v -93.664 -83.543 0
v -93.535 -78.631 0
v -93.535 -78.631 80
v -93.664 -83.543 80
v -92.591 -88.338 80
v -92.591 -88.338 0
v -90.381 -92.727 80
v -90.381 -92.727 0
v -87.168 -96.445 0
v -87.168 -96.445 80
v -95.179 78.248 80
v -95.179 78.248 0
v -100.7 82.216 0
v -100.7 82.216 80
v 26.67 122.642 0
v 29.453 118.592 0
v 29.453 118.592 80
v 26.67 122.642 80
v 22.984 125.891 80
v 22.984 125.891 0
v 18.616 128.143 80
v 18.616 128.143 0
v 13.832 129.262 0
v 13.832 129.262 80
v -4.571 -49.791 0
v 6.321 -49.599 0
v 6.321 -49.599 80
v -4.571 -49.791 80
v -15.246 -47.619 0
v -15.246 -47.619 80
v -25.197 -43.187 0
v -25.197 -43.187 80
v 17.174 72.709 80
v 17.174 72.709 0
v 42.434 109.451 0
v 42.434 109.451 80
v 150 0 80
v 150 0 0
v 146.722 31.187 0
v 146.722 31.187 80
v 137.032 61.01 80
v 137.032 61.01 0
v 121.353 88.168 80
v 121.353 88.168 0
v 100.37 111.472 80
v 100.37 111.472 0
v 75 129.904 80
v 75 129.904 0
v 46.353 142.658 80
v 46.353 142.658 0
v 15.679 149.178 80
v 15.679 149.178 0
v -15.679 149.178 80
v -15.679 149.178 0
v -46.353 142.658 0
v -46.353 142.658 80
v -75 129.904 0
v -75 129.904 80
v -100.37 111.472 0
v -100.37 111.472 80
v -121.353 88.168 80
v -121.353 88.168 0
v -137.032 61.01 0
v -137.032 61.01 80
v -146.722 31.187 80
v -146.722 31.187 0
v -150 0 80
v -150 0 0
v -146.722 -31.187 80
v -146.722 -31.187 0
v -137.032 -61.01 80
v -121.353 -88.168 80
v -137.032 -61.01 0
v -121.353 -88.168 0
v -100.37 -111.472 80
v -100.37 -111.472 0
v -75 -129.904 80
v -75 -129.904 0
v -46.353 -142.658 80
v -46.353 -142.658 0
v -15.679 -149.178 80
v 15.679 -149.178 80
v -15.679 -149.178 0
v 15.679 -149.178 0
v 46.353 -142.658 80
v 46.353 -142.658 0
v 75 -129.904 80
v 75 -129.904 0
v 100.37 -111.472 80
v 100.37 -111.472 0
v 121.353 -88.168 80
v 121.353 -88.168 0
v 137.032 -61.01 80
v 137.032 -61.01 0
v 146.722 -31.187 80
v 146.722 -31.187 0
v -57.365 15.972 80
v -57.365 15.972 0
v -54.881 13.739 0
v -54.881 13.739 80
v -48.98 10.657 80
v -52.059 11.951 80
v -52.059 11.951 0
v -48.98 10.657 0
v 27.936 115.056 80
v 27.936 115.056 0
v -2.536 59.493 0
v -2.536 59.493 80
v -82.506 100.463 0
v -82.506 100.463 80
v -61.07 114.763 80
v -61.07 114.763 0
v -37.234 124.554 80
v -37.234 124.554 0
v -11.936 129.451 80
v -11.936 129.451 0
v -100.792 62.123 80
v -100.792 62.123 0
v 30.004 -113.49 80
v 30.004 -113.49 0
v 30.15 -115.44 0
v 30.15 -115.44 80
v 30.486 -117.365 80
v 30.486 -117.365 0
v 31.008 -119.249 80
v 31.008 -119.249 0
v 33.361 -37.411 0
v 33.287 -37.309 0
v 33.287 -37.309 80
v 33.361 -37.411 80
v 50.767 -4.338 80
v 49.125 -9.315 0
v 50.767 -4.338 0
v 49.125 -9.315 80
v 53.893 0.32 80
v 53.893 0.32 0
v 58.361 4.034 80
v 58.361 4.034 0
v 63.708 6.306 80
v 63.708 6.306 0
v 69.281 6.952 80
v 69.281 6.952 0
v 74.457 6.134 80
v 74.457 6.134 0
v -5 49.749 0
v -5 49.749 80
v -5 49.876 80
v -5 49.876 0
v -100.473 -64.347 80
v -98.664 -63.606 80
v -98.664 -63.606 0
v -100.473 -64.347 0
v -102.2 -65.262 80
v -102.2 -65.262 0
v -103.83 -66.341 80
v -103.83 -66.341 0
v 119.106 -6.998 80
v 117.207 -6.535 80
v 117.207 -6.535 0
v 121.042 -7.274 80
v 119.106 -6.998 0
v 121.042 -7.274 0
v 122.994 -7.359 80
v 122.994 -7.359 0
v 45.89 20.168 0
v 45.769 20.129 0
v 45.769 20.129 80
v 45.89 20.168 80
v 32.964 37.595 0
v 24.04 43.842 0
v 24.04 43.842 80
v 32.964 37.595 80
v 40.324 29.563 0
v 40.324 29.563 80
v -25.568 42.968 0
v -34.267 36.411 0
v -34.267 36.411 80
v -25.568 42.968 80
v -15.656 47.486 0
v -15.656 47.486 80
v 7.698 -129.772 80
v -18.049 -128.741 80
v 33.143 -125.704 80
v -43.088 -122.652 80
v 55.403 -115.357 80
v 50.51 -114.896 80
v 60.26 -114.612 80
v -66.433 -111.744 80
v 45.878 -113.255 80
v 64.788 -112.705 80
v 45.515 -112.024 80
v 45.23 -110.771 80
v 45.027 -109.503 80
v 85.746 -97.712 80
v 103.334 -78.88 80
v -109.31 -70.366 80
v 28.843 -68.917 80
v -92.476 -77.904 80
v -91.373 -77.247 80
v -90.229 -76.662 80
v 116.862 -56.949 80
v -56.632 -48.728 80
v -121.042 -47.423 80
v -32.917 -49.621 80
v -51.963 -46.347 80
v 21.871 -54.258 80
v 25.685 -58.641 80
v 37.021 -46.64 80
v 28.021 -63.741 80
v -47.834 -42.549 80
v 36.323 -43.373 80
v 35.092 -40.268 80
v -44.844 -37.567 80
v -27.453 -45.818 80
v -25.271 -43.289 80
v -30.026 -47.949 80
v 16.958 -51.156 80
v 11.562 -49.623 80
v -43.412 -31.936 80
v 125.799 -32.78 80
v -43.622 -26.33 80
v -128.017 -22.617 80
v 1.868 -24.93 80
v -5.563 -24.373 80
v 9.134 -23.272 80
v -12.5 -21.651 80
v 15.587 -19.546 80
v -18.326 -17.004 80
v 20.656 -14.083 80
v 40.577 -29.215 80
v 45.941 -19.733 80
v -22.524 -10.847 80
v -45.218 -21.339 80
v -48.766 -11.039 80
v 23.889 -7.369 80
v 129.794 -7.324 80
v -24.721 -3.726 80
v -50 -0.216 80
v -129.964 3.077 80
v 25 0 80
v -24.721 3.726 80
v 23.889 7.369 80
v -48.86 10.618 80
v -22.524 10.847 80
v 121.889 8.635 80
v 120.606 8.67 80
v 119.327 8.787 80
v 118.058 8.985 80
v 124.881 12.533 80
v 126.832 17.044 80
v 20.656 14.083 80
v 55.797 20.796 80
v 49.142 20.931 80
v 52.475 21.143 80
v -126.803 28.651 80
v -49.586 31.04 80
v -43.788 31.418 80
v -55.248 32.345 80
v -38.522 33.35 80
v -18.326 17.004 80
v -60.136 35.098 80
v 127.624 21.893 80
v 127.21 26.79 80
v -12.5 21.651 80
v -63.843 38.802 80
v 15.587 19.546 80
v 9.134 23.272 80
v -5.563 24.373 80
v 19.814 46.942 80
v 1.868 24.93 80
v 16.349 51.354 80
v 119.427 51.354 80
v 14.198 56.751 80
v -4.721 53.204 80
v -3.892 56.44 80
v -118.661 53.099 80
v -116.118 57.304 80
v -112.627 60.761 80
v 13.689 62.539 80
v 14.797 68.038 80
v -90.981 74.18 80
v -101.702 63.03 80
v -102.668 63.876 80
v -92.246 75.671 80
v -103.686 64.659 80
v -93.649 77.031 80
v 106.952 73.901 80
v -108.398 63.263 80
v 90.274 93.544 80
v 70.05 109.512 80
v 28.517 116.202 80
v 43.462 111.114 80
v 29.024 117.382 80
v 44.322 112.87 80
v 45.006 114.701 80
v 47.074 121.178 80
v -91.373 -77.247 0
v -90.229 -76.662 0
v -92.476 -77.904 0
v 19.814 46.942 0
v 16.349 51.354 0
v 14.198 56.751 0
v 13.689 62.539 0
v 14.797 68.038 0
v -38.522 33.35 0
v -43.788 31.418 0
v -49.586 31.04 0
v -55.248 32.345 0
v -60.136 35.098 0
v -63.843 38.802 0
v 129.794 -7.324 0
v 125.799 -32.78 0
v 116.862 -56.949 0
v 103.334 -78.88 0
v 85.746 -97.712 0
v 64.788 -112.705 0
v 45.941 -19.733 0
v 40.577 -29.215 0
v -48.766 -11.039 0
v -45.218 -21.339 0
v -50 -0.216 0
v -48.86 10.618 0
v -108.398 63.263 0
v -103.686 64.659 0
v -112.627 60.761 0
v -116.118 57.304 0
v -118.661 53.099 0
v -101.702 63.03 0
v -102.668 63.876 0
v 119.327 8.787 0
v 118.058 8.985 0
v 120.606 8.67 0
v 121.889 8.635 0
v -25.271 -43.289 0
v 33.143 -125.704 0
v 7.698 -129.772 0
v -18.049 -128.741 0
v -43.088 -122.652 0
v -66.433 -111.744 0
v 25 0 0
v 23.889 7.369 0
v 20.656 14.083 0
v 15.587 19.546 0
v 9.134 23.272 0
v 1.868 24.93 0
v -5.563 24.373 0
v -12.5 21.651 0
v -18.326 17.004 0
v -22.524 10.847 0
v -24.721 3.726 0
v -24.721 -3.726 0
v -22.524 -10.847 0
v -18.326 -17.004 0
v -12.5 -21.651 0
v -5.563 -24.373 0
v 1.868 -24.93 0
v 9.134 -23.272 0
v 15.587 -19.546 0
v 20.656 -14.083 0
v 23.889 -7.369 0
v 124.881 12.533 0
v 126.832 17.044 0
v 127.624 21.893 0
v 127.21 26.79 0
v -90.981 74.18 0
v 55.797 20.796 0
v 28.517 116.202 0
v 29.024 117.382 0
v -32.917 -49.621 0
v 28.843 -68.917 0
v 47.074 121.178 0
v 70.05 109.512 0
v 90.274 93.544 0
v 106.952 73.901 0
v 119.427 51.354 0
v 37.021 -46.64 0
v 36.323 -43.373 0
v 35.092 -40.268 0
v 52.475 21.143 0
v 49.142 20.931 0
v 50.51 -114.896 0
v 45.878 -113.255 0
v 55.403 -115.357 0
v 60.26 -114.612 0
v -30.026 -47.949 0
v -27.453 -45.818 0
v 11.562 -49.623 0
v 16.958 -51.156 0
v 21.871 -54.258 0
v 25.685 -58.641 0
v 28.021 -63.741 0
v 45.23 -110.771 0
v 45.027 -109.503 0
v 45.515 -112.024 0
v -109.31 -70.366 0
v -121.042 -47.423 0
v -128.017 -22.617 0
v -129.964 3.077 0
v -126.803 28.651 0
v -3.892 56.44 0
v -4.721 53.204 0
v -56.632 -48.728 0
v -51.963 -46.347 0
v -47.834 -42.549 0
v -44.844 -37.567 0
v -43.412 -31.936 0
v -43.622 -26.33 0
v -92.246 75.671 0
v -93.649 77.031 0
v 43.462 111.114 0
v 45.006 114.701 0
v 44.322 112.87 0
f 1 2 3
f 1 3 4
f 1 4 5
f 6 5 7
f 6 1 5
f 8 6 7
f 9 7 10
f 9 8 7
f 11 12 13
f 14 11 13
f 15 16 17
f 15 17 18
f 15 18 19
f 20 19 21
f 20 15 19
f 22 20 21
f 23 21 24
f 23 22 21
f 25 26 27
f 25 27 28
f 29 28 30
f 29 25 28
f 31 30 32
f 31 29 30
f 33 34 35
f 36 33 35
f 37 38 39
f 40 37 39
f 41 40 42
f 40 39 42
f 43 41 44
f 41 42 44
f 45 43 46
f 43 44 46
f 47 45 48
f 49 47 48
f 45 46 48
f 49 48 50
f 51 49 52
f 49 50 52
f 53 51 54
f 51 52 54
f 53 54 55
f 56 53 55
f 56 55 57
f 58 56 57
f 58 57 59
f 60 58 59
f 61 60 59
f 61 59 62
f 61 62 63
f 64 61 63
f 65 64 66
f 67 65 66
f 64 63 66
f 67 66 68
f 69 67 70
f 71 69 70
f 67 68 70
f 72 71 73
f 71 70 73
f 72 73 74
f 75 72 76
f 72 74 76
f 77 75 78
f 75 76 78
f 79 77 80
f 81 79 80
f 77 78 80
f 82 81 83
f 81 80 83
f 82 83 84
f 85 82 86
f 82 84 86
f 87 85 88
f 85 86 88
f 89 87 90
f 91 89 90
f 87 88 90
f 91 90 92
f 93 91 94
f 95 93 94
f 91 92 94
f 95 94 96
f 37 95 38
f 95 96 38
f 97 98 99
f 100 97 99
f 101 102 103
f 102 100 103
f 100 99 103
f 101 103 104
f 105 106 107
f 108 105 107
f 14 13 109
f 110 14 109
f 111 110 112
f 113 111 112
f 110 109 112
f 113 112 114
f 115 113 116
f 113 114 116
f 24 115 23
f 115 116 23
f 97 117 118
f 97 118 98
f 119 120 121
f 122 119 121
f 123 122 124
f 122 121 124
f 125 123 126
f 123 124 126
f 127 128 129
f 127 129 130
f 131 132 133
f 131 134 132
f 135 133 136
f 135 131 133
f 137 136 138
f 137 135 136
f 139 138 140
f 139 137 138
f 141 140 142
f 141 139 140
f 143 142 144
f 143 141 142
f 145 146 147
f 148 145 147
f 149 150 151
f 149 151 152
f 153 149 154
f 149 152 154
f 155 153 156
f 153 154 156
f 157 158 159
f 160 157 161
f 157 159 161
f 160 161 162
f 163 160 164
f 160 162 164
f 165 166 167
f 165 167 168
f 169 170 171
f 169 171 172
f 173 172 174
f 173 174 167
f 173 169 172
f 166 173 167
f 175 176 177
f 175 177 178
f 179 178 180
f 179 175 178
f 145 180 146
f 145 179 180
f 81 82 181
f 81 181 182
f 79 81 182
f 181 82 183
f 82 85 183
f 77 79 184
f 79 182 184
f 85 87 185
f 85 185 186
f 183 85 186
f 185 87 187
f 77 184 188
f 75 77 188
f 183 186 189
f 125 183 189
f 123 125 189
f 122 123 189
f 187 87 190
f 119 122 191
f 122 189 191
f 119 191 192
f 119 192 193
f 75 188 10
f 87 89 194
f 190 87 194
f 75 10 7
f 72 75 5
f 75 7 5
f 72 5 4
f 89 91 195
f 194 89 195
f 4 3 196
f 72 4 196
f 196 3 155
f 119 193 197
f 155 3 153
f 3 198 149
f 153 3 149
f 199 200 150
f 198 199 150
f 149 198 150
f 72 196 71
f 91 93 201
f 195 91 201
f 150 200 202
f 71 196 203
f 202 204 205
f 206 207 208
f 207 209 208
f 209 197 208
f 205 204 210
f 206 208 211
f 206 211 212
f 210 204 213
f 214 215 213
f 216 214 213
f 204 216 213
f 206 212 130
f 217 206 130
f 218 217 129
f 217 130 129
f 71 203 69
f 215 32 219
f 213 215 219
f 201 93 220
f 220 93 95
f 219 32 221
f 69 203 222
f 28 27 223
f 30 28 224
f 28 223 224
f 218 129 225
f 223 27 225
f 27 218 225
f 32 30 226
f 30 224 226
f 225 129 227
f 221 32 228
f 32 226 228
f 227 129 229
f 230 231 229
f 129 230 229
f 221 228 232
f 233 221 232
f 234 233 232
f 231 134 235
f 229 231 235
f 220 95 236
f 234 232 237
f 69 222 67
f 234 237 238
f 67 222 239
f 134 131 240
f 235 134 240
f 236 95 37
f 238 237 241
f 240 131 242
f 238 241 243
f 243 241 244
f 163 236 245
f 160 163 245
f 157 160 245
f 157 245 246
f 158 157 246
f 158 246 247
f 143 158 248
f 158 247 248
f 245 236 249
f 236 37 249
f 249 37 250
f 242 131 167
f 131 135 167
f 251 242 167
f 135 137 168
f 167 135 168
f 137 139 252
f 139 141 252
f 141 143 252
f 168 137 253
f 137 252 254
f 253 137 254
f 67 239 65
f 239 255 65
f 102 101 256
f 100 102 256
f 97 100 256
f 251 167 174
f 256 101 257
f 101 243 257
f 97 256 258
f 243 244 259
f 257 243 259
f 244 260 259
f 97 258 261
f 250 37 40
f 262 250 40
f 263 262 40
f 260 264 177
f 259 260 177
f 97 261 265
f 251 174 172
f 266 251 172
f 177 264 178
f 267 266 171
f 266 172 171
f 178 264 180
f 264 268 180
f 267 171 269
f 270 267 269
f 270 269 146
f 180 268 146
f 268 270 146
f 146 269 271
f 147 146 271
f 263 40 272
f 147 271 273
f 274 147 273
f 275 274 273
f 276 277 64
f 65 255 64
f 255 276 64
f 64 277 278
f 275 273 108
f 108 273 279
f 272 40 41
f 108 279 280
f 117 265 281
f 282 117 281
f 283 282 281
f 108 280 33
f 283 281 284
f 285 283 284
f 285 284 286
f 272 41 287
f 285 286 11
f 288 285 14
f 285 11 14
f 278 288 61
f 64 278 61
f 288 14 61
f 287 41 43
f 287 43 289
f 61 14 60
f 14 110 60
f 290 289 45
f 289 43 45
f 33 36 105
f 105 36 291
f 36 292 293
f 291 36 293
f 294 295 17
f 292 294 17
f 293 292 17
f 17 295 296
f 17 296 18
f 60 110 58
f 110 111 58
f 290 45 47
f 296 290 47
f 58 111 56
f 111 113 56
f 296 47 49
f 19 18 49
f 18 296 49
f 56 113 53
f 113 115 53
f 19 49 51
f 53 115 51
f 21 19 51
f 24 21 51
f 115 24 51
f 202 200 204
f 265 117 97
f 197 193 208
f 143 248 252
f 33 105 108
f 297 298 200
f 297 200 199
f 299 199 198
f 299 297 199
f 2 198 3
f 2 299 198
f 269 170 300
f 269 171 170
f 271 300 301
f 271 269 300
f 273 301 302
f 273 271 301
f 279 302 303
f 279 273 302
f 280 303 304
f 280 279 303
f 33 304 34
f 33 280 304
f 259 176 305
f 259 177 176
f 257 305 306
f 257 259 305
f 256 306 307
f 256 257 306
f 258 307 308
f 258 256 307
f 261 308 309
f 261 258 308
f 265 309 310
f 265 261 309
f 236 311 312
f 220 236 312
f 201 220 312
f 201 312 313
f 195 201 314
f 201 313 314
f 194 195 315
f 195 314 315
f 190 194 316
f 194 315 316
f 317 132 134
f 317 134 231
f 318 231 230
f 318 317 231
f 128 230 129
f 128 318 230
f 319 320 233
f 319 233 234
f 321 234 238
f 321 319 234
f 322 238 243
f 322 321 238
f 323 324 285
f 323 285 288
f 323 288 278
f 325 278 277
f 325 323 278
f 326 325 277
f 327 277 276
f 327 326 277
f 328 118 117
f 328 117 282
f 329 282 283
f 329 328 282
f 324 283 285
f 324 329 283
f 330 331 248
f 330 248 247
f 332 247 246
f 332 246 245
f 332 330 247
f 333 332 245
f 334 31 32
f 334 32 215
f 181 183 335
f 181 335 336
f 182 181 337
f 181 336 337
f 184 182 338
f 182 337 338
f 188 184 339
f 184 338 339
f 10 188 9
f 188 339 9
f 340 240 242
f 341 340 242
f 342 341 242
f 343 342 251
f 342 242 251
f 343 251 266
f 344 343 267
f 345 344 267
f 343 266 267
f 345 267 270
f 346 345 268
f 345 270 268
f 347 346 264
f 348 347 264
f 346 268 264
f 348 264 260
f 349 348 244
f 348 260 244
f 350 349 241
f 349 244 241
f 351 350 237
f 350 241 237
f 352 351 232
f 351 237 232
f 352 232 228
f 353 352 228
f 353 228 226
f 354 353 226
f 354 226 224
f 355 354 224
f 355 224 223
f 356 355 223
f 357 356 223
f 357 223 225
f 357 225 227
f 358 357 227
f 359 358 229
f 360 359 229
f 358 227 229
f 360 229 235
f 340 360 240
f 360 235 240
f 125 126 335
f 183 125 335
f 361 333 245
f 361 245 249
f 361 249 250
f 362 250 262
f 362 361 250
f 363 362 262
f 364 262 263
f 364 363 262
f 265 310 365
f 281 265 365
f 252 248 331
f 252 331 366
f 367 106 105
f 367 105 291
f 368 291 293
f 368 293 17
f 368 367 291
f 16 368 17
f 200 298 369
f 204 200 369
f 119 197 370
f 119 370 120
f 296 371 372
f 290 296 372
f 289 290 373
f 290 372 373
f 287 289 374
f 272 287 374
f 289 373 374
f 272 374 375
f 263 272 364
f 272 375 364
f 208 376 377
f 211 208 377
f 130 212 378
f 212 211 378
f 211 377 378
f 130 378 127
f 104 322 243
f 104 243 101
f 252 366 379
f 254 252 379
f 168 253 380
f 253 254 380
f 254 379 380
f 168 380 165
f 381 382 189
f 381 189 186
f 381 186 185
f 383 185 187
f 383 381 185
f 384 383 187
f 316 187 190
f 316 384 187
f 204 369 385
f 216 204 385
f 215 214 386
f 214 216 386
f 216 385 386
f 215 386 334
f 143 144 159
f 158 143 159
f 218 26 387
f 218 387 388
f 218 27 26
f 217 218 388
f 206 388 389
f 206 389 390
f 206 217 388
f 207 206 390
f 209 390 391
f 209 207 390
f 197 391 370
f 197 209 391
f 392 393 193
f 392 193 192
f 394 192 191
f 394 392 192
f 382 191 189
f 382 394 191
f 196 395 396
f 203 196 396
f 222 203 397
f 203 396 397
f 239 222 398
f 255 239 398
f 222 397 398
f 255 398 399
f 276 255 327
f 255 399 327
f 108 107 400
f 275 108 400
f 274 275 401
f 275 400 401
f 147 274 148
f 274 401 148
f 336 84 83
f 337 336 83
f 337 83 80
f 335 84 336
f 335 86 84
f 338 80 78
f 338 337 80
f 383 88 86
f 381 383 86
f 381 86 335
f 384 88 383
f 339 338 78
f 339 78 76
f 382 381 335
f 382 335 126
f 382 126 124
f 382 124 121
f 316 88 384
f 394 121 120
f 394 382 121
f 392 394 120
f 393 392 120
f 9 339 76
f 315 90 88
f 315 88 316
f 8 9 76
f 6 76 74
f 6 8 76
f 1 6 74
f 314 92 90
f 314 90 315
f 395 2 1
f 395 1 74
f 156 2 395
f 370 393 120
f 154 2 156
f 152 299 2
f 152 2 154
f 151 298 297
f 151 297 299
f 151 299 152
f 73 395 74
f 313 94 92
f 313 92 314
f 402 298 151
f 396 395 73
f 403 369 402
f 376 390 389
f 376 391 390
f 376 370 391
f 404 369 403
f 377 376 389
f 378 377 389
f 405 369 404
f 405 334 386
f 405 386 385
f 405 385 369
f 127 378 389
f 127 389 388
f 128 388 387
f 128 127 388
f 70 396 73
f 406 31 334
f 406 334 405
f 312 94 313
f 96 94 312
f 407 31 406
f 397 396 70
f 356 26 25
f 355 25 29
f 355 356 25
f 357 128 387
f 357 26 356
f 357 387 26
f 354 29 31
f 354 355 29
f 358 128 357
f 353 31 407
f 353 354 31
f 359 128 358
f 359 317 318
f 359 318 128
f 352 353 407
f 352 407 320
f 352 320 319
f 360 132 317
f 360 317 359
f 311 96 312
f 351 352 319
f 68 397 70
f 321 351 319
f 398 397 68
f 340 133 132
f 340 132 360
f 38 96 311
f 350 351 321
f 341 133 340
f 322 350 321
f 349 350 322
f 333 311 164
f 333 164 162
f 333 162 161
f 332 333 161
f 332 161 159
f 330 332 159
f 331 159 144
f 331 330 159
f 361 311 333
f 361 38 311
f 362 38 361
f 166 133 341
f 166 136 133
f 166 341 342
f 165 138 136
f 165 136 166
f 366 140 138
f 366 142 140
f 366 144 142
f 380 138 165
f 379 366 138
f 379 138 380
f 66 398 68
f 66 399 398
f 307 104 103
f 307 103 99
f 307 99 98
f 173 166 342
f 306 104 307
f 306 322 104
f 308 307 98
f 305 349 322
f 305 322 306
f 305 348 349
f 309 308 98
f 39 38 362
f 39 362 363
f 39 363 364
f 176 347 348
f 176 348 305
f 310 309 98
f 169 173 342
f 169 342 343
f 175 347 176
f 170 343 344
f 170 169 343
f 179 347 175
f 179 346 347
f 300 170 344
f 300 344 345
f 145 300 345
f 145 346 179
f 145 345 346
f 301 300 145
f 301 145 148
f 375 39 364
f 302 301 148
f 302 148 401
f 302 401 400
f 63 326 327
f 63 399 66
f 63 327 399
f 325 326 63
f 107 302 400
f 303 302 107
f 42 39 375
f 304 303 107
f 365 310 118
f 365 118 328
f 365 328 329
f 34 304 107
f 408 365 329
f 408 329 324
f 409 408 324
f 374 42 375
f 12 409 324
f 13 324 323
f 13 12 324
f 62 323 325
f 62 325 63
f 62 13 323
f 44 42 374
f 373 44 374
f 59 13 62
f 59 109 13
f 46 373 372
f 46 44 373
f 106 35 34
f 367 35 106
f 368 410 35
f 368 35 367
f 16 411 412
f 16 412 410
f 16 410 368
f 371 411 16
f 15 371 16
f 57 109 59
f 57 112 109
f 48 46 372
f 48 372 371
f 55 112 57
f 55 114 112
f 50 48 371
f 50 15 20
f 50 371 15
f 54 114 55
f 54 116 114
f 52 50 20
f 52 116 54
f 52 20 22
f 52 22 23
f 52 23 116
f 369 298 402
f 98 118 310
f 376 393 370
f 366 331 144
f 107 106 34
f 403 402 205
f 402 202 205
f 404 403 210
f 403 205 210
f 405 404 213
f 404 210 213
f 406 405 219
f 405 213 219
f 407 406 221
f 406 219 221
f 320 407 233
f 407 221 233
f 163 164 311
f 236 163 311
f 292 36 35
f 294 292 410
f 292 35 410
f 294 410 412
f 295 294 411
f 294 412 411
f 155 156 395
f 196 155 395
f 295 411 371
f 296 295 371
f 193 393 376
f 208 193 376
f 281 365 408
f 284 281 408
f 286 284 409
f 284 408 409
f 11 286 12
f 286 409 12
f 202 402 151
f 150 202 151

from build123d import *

# Parameters (mm, degrees)
SKETCH1_R           = 150
BOSS_EXTRUDE1_DEPTH = 80
BOSS_EXTRUDE2_DEPTH = 80
LOFT1_DEPTH         = 80
CIRPATTERN1_COUNT   = 5
FILLET1_R           = 20
FILLET2_R           = 20
FILLET3_R           = 20
SKETCH3_R           = 25
CUT_EXTRUDE1_DEPTH  = 80


with BuildPart() as part:
    # Sketch1 → Boss-Extrude1 (new body)
    with BuildSketch(Plane.XY):
        Circle(SKETCH1_R)
        with BuildLine():
            Line((129.710171657, 8.675907367), (119.956691368, 8.625091073))
            Line((119.956691368, 8.625091073), (120.040051321, -7.374691773))
            Line((120.040051321, -7.374691773), (129.793531611, -7.323875479))
            ThreePointArc((129.793531611, -7.323875479), (105.568888587, -75.86309882), (48.333925621, -120.680701166))
            Line((48.333925621, -120.680701166), (45.271605291, -111.420293279))
            Line((45.271605291, -111.420293279), (30.080667198, -116.443778112))
            Line((30.080667198, -116.443778112), (33.142987529, -125.704185999))
            ThreePointArc((33.142987529, -125.704185999), (-39.527513828, -123.84496619), (-99.838162814, -83.260682474))
            Line((-99.838162814, -83.260682474), (-91.977300573, -77.486619356))
            Line((-91.977300573, -77.486619356), (-101.449176589, -64.591520879))
            Line((-101.449176589, -64.591520879), (-109.310038829, -70.365583996))
            ThreePointArc((-109.310038829, -70.365583996), (-129.998235624, -0.677299621), (-110.037303615, 69.222769471))
            Line((-110.037303615, 69.222769471), (-102.116703238, 63.530928844))
            Line((-102.116703238, 63.530928844), (-92.779706461, 76.524022824))
            Line((-92.779706461, 76.524022824), (-100.700306837, 82.215863451))
            ThreePointArc((-100.700306837, 82.215863451), (-40.815814265, 123.426372003), (31.831369149, 126.042706802))
            Line((31.831369149, 126.042706802), (28.865707153, 116.750892719))
            Line((28.865707153, 116.750892719), (44.10816453, 111.88596794))
            Line((44.10816453, 111.88596794), (47.073826527, 121.177782024))
            ThreePointArc((47.073826527, 121.177782024), (104.772675129, 76.958992627), (129.710171657, 8.675907367))
        make_face(mode=Mode.SUBTRACT)
    extrude(amount=BOSS_EXTRUDE1_DEPTH)


with BuildPart() as body_2:
    # Sketch2 → Boss-Extrude2 (new body)
    with BuildSketch(Plane.XY):
        with BuildLine():
            Line((-5, 55), (5, 55))
            Line((5, 55), (5, 49.749371855))
            ThreePointArc((5, 49.749371855), (29.389262615, 40.450849719), (45.769379313, 20.128683944))
            Line((45.769379313, 20.128683944), (50.763023424, 21.751217272))
            Line((50.763023424, 21.751217272), (53.853193368, 12.240652109))
            Line((53.853193368, 12.240652109), (48.859549256, 10.618118781))
            ThreePointArc((48.859549256, 10.618118781), (47.552825815, -15.450849719), (33.287032059, -37.309161029))
            Line((33.287032059, -37.309161029), (36.373273848, -41.557008429))
            Line((36.373273848, -41.557008429), (28.283103904, -47.434860952))
            Line((28.283103904, -47.434860952), (25.196862116, -43.187013552))
            ThreePointArc((25.196862116, -43.187013552), (0, -50), (-25.196862116, -43.187013552))
            Line((-25.196862116, -43.187013552), (-28.283103904, -47.434860952))
            Line((-28.283103904, -47.434860952), (-36.373273848, -41.557008429))
            Line((-36.373273848, -41.557008429), (-33.287032059, -37.309161029))
            ThreePointArc((-33.287032059, -37.309161029), (-47.552825815, -15.450849719), (-48.859549256, 10.618118781))
            Line((-48.859549256, 10.618118781), (-53.853193368, 12.240652109))
            Line((-53.853193368, 12.240652109), (-50.763023424, 21.751217272))
            Line((-50.763023424, 21.751217272), (-45.769379313, 20.128683944))
            ThreePointArc((-45.769379313, 20.128683944), (-29.389262615, 40.450849719), (-5, 49.749371855))
            Line((-5, 49.749371855), (-5, 55))
        make_face()
    extrude(amount=BOSS_EXTRUDE2_DEPTH)


with BuildPart() as body_3:
    # Loft1: read off the stored shape, not the designer's step
    # Loft1 outline → Loft1 (new body)
    with BuildSketch(Plane.XY):
        Polygon((44.10816453, 111.88596794), (28.865707153, 116.750892719), (-5, 55), (5, 55), align=None)
    extrude(amount=LOFT1_DEPTH)


with BuildPart() as cirpattern1_1:
    # CirPattern1: pattern copy
    add(body_3.part.rotate(Axis((0, 0, 0), (0, 0, 1)), 1 * 360 / CIRPATTERN1_COUNT))


with BuildPart() as cirpattern1_2:
    # CirPattern1: pattern copy
    add(body_3.part.rotate(Axis((0, 0, 0), (0, 0, 1)), 2 * 360 / CIRPATTERN1_COUNT))


with BuildPart() as cirpattern1_3:
    # CirPattern1: pattern copy
    add(body_3.part.rotate(Axis((0, 0, 0), (0, 0, 1)), 3 * 360 / CIRPATTERN1_COUNT))


with BuildPart() as cirpattern1_4:
    # CirPattern1: pattern copy
    add(body_3.part.rotate(Axis((0, 0, 0), (0, 0, 1)), 4 * 360 / CIRPATTERN1_COUNT))

    # Combine1: union body 2, part, body 3, CirPattern1_1, CirPattern1_2, CirPattern1_3
    add(body_2.part)
    add(part.part)
    add(body_3.part)
    add(cirpattern1_1.part)
    add(cirpattern1_2.part)
    add(cirpattern1_3.part)

    # Fillet1
    # the kernel refuses this fillet: 20 mm, written as the material it adds along each edge
    with BuildSketch(Plane(origin=(-91.977300573, -77.486619356, 0), x_dir=(-0.8059436548419507, -0.5919922509796886, 0), z_dir=(0, 0, 1)), Plane(origin=(45.271605291, -111.420293279, 0), x_dir=(0.31396780203564834, -0.9494336307951725, 0), z_dir=(0, 0, 1)), Plane(origin=(-102.116703238, 63.530928844, 0), x_dir=(-0.8120683737452884, 0.5835622986131666, 0), z_dir=(0, 0, 1))) as fillet1_piece_1:
        with BuildLine():
            CenterArc((FILLET1_R * 0.0966409957188, FILLET1_R), FILLET1_R, 258.96004162, 11.03995838)
            Line((-FILLET1_R * 0.0948525451909, FILLET1_R * 0.0185061264634), (0, 0))
            Line((0, 0), (FILLET1_R * 0.0966409957188, 0))
        make_face()
    extrude(amount=80)
    with BuildSketch(Plane(origin=(119.956691369, 8.625091073, 0), x_dir=(-0.9824782333673042, 0.1863773617139722, 0), z_dir=(0, 0, 1))) as fillet1_piece_2:
        with BuildLine():
            CenterArc((FILLET1_R * 0.0966409957054, -FILLET1_R), FILLET1_R, 90, 11.03995838)
            Line((-FILLET1_R * 0.0948525452044, -FILLET1_R * 0.0185061264634), (0, 0))
            Line((0, 0), (FILLET1_R * 0.0966409957054, 0))
        make_face()
    extrude(amount=80)
    with BuildSketch(Plane(origin=(28.865707153, 116.750892719, 0), x_dir=(-0.4808578750966385, -0.8767985538067142, 0), z_dir=(0, 0, 1))) as fillet1_piece_3:
        with BuildLine():
            CenterArc((FILLET1_R * 0.0966409957188, -FILLET1_R), FILLET1_R, 90.000000002, 11.03995838)
            Line((-FILLET1_R * 0.0948525452298, -FILLET1_R * 0.018506126471), (0, 0))
            Line((0, 0), (FILLET1_R * 0.0966409956792, 0))
        make_face()
    extrude(amount=80)
    with BuildSketch(Plane(origin=(-36.373273848, -41.557008429, 0), x_dir=(-0.9426873980194184, -0.33367719372977617, 0), z_dir=(0, 0, 1)), Plane(origin=(28.283103904, -47.434860952, 0), x_dir=(0.026039443064681988, -0.9996609162135335, 0), z_dir=(0, 0, 1)), Plane(origin=(53.853193368, 12.240652109, 0), x_dir=(0.9587806588816111, -0.28414722971470946, 0), z_dir=(0, 0, 1)), Plane(origin=(5, 55, 0), x_dir=(0.5665195918801321, 0.8240482704404934, 0), z_dir=(0, 0, 1)), Plane(origin=(-50.763023424, 21.751217272, 0), x_dir=(-0.6086522958068845, 0.7934370692178484, 0), z_dir=(0, 0, 1))) as fillet1_piece_4:
        with BuildLine():
            CenterArc((6.167760881, -20), FILLET1_R, 90, 31.649839664)
            Line((-4.326771041, -2.974583714), (0, 0))
            Line((0, 0), (6.167760881, 0))
        make_face()
    extrude(amount=80)
    # the kernel refuses this fillet: 20 mm, written as the material it takes off along each edge
    with BuildSketch(Plane(origin=(-101.449176589, -64.591520879, -7.386208111), x_dir=(0.9426873980435565, 0.33367719366158266, 0), z_dir=(0, 0, 1)), Plane(origin=(30.080667198, -116.443778112, -7.386208111), x_dir=(-0.026039442992376174, 0.9996609162154169, 0), z_dir=(0, 0, 1)), Plane(origin=(44.10816453, 111.88596794, -7.386208111), x_dir=(-0.566519591939725, -0.8240482703995243, 0), z_dir=(0, 0, 1)), Plane(origin=(-92.779706461, 76.524022824, -7.386208111), x_dir=(0.6086522957494933, -0.7934370692618736, 0), z_dir=(0, 0, 1))) as fillet1_2_piece_1:
        with BuildLine():
            CenterArc((FILLET1_R * 0.147724162219, -FILLET1_R), FILLET1_R, 90.000000004, 16.806393351)
            Line((-FILLET1_R * 0.141414455522, -FILLET1_R * 0.042712760071), (0, 0))
            Line((0, 0), (FILLET1_R * 0.147724162147, 0))
        make_face()
    extrude(amount=94.772416222, mode=Mode.SUBTRACT)
    with BuildSketch(Plane(origin=(120.040051322, -7.374691773, -7.38620811), x_dir=(-0.9587806588816119, 0.2841472297147065, 0), z_dir=(0, 0, 1))) as fillet1_2_piece_2:
        with BuildLine():
            CenterArc((FILLET1_R * 0.14772416216, -FILLET1_R), FILLET1_R, 90, 16.806393351)
            Line((-FILLET1_R * 0.141414455511, -FILLET1_R * 0.04271276005), (0, 0))
            Line((0, 0), (FILLET1_R * 0.14772416216, 0))
        make_face()
    extrude(amount=94.77241622, mode=Mode.SUBTRACT)
    with BuildSketch(Plane(origin=(-28.283103904, -47.434860952, -12.810588384), x_dir=(-0.9043914519746539, -0.426703763277496, 0), z_dir=(0, 0, 1)), Plane(origin=(36.373273848, -41.557008429, -12.810588384), x_dir=(0.12634706636512016, -0.9919860980986216, 0), z_dir=(0, 0, 1)), Plane(origin=(50.763023424, 21.751217272, -12.810588384), x_dir=(0.9824782333673043, -0.18637736171397165, 0), z_dir=(0, 0, 1)), Plane(origin=(-53.853193368, 12.240652109, -12.810588384), x_dir=(-0.6852917228203294, 0.7282686692656392, 0), z_dir=(0, 0, 1))) as fillet1_2_piece_3:
        with BuildLine():
            CenterArc((FILLET1_R * 0.256211767685, -FILLET1_R), FILLET1_R, 90, 28.741446185)
            Line((-FILLET1_R * 0.224646107378, -FILLET1_R * 0.123201446175), (0, 0))
            Line((0, 0), (FILLET1_R * 0.256211767684, 0))
        make_face()
    extrude(amount=105.621176768, mode=Mode.SUBTRACT)
    with BuildSketch(Plane(origin=(-5, 55, -12.810588384), x_dir=(0, -1, 0), z_dir=(0, 0, 1))) as fillet1_2_piece_4:
        with BuildLine():
            CenterArc((FILLET1_R * 0.256211767684, FILLET1_R), FILLET1_R, 241.258553815, 28.741446185)
            Line((-FILLET1_R * 0.224646107378, FILLET1_R * 0.123201446174), (0, 0))
            Line((0, 0), (FILLET1_R * 0.256211767684, 0))
        make_face()
    extrude(amount=105.621176768, mode=Mode.SUBTRACT)

    # Fillet2
    fillet2_edges = [cirpattern1_4.edges().sort_by_distance(p)[0] for p in [
        (-45.769379313, 20.128683944, 40),
        (5, 49.749371855, 40),
        (48.859549256, 10.618118781, 40),
        (25.196862116, -43.187013552, 40),
        (-33.287032059, -37.309161029, 40),
    ]]
    fillet(fillet2_edges, radius=FILLET2_R - 0.0001)  # a hair under: the kernel refuses the full size

    # Fillet3
    # the kernel refuses this fillet: 20 mm, written as the material it adds along each edge
    with BuildSketch(Plane(origin=(-99.838162814, -83.260682474, 0), x_dir=(0.6928923413155604, -0.7210410552432093, 0), z_dir=(0, 0, 1)), Plane(origin=(48.333925621, -120.680701166, 0), x_dir=(0.899866302844142, 0.43616583658697394, 0), z_dir=(0, 0, 1)), Plane(origin=(129.710171657, 8.675907367, 0), x_dir=(-0.1367443808271708, 0.9906063669854912, 0), z_dir=(0, 0, 1)), Plane(origin=(31.831369149, 126.042706802, 0), x_dir=(-0.9843789779658949, 0.17606256768211787, 0), z_dir=(0, 0, 1)), Plane(origin=(-110.037303615, 69.222769471, 0), x_dir=(-0.4716352853666361, -0.881793716011365, 0), z_dir=(0, 0, 1))) as fillet3_piece_1:
        with BuildLine():
            CenterArc((16.878882523, 19.95047746), FILLET3_R, 217.581129198, 56.451736362)
            Line((1.029071396, 7.752793776), (0.712075174, 7.508840102))
            ThreePointArc((0.712075174, 7.508840102), (0.118013554, 3.929029475), (-0.396522144, 0.052632587))
            Line((-0.396522144, 0.052632587), (-0.028131471, -0.399009549))
            ThreePointArc((-0.028131471, -0.399009549), (9.142728033, -0.721896513), (18.313587537, -0.399009549))
            Line((18.313587537, -0.399009549), (18.285456067, 0))
        make_face()
    extrude(amount=80)

    # Sketch3 → Cut-Extrude1 (cut)
    with BuildSketch(Plane.XY.offset(80)):
        Circle(SKETCH3_R)
    extrude(amount=-CUT_EXTRUDE1_DEPTH, mode=Mode.SUBTRACT)


solid = cirpattern1_4.part
